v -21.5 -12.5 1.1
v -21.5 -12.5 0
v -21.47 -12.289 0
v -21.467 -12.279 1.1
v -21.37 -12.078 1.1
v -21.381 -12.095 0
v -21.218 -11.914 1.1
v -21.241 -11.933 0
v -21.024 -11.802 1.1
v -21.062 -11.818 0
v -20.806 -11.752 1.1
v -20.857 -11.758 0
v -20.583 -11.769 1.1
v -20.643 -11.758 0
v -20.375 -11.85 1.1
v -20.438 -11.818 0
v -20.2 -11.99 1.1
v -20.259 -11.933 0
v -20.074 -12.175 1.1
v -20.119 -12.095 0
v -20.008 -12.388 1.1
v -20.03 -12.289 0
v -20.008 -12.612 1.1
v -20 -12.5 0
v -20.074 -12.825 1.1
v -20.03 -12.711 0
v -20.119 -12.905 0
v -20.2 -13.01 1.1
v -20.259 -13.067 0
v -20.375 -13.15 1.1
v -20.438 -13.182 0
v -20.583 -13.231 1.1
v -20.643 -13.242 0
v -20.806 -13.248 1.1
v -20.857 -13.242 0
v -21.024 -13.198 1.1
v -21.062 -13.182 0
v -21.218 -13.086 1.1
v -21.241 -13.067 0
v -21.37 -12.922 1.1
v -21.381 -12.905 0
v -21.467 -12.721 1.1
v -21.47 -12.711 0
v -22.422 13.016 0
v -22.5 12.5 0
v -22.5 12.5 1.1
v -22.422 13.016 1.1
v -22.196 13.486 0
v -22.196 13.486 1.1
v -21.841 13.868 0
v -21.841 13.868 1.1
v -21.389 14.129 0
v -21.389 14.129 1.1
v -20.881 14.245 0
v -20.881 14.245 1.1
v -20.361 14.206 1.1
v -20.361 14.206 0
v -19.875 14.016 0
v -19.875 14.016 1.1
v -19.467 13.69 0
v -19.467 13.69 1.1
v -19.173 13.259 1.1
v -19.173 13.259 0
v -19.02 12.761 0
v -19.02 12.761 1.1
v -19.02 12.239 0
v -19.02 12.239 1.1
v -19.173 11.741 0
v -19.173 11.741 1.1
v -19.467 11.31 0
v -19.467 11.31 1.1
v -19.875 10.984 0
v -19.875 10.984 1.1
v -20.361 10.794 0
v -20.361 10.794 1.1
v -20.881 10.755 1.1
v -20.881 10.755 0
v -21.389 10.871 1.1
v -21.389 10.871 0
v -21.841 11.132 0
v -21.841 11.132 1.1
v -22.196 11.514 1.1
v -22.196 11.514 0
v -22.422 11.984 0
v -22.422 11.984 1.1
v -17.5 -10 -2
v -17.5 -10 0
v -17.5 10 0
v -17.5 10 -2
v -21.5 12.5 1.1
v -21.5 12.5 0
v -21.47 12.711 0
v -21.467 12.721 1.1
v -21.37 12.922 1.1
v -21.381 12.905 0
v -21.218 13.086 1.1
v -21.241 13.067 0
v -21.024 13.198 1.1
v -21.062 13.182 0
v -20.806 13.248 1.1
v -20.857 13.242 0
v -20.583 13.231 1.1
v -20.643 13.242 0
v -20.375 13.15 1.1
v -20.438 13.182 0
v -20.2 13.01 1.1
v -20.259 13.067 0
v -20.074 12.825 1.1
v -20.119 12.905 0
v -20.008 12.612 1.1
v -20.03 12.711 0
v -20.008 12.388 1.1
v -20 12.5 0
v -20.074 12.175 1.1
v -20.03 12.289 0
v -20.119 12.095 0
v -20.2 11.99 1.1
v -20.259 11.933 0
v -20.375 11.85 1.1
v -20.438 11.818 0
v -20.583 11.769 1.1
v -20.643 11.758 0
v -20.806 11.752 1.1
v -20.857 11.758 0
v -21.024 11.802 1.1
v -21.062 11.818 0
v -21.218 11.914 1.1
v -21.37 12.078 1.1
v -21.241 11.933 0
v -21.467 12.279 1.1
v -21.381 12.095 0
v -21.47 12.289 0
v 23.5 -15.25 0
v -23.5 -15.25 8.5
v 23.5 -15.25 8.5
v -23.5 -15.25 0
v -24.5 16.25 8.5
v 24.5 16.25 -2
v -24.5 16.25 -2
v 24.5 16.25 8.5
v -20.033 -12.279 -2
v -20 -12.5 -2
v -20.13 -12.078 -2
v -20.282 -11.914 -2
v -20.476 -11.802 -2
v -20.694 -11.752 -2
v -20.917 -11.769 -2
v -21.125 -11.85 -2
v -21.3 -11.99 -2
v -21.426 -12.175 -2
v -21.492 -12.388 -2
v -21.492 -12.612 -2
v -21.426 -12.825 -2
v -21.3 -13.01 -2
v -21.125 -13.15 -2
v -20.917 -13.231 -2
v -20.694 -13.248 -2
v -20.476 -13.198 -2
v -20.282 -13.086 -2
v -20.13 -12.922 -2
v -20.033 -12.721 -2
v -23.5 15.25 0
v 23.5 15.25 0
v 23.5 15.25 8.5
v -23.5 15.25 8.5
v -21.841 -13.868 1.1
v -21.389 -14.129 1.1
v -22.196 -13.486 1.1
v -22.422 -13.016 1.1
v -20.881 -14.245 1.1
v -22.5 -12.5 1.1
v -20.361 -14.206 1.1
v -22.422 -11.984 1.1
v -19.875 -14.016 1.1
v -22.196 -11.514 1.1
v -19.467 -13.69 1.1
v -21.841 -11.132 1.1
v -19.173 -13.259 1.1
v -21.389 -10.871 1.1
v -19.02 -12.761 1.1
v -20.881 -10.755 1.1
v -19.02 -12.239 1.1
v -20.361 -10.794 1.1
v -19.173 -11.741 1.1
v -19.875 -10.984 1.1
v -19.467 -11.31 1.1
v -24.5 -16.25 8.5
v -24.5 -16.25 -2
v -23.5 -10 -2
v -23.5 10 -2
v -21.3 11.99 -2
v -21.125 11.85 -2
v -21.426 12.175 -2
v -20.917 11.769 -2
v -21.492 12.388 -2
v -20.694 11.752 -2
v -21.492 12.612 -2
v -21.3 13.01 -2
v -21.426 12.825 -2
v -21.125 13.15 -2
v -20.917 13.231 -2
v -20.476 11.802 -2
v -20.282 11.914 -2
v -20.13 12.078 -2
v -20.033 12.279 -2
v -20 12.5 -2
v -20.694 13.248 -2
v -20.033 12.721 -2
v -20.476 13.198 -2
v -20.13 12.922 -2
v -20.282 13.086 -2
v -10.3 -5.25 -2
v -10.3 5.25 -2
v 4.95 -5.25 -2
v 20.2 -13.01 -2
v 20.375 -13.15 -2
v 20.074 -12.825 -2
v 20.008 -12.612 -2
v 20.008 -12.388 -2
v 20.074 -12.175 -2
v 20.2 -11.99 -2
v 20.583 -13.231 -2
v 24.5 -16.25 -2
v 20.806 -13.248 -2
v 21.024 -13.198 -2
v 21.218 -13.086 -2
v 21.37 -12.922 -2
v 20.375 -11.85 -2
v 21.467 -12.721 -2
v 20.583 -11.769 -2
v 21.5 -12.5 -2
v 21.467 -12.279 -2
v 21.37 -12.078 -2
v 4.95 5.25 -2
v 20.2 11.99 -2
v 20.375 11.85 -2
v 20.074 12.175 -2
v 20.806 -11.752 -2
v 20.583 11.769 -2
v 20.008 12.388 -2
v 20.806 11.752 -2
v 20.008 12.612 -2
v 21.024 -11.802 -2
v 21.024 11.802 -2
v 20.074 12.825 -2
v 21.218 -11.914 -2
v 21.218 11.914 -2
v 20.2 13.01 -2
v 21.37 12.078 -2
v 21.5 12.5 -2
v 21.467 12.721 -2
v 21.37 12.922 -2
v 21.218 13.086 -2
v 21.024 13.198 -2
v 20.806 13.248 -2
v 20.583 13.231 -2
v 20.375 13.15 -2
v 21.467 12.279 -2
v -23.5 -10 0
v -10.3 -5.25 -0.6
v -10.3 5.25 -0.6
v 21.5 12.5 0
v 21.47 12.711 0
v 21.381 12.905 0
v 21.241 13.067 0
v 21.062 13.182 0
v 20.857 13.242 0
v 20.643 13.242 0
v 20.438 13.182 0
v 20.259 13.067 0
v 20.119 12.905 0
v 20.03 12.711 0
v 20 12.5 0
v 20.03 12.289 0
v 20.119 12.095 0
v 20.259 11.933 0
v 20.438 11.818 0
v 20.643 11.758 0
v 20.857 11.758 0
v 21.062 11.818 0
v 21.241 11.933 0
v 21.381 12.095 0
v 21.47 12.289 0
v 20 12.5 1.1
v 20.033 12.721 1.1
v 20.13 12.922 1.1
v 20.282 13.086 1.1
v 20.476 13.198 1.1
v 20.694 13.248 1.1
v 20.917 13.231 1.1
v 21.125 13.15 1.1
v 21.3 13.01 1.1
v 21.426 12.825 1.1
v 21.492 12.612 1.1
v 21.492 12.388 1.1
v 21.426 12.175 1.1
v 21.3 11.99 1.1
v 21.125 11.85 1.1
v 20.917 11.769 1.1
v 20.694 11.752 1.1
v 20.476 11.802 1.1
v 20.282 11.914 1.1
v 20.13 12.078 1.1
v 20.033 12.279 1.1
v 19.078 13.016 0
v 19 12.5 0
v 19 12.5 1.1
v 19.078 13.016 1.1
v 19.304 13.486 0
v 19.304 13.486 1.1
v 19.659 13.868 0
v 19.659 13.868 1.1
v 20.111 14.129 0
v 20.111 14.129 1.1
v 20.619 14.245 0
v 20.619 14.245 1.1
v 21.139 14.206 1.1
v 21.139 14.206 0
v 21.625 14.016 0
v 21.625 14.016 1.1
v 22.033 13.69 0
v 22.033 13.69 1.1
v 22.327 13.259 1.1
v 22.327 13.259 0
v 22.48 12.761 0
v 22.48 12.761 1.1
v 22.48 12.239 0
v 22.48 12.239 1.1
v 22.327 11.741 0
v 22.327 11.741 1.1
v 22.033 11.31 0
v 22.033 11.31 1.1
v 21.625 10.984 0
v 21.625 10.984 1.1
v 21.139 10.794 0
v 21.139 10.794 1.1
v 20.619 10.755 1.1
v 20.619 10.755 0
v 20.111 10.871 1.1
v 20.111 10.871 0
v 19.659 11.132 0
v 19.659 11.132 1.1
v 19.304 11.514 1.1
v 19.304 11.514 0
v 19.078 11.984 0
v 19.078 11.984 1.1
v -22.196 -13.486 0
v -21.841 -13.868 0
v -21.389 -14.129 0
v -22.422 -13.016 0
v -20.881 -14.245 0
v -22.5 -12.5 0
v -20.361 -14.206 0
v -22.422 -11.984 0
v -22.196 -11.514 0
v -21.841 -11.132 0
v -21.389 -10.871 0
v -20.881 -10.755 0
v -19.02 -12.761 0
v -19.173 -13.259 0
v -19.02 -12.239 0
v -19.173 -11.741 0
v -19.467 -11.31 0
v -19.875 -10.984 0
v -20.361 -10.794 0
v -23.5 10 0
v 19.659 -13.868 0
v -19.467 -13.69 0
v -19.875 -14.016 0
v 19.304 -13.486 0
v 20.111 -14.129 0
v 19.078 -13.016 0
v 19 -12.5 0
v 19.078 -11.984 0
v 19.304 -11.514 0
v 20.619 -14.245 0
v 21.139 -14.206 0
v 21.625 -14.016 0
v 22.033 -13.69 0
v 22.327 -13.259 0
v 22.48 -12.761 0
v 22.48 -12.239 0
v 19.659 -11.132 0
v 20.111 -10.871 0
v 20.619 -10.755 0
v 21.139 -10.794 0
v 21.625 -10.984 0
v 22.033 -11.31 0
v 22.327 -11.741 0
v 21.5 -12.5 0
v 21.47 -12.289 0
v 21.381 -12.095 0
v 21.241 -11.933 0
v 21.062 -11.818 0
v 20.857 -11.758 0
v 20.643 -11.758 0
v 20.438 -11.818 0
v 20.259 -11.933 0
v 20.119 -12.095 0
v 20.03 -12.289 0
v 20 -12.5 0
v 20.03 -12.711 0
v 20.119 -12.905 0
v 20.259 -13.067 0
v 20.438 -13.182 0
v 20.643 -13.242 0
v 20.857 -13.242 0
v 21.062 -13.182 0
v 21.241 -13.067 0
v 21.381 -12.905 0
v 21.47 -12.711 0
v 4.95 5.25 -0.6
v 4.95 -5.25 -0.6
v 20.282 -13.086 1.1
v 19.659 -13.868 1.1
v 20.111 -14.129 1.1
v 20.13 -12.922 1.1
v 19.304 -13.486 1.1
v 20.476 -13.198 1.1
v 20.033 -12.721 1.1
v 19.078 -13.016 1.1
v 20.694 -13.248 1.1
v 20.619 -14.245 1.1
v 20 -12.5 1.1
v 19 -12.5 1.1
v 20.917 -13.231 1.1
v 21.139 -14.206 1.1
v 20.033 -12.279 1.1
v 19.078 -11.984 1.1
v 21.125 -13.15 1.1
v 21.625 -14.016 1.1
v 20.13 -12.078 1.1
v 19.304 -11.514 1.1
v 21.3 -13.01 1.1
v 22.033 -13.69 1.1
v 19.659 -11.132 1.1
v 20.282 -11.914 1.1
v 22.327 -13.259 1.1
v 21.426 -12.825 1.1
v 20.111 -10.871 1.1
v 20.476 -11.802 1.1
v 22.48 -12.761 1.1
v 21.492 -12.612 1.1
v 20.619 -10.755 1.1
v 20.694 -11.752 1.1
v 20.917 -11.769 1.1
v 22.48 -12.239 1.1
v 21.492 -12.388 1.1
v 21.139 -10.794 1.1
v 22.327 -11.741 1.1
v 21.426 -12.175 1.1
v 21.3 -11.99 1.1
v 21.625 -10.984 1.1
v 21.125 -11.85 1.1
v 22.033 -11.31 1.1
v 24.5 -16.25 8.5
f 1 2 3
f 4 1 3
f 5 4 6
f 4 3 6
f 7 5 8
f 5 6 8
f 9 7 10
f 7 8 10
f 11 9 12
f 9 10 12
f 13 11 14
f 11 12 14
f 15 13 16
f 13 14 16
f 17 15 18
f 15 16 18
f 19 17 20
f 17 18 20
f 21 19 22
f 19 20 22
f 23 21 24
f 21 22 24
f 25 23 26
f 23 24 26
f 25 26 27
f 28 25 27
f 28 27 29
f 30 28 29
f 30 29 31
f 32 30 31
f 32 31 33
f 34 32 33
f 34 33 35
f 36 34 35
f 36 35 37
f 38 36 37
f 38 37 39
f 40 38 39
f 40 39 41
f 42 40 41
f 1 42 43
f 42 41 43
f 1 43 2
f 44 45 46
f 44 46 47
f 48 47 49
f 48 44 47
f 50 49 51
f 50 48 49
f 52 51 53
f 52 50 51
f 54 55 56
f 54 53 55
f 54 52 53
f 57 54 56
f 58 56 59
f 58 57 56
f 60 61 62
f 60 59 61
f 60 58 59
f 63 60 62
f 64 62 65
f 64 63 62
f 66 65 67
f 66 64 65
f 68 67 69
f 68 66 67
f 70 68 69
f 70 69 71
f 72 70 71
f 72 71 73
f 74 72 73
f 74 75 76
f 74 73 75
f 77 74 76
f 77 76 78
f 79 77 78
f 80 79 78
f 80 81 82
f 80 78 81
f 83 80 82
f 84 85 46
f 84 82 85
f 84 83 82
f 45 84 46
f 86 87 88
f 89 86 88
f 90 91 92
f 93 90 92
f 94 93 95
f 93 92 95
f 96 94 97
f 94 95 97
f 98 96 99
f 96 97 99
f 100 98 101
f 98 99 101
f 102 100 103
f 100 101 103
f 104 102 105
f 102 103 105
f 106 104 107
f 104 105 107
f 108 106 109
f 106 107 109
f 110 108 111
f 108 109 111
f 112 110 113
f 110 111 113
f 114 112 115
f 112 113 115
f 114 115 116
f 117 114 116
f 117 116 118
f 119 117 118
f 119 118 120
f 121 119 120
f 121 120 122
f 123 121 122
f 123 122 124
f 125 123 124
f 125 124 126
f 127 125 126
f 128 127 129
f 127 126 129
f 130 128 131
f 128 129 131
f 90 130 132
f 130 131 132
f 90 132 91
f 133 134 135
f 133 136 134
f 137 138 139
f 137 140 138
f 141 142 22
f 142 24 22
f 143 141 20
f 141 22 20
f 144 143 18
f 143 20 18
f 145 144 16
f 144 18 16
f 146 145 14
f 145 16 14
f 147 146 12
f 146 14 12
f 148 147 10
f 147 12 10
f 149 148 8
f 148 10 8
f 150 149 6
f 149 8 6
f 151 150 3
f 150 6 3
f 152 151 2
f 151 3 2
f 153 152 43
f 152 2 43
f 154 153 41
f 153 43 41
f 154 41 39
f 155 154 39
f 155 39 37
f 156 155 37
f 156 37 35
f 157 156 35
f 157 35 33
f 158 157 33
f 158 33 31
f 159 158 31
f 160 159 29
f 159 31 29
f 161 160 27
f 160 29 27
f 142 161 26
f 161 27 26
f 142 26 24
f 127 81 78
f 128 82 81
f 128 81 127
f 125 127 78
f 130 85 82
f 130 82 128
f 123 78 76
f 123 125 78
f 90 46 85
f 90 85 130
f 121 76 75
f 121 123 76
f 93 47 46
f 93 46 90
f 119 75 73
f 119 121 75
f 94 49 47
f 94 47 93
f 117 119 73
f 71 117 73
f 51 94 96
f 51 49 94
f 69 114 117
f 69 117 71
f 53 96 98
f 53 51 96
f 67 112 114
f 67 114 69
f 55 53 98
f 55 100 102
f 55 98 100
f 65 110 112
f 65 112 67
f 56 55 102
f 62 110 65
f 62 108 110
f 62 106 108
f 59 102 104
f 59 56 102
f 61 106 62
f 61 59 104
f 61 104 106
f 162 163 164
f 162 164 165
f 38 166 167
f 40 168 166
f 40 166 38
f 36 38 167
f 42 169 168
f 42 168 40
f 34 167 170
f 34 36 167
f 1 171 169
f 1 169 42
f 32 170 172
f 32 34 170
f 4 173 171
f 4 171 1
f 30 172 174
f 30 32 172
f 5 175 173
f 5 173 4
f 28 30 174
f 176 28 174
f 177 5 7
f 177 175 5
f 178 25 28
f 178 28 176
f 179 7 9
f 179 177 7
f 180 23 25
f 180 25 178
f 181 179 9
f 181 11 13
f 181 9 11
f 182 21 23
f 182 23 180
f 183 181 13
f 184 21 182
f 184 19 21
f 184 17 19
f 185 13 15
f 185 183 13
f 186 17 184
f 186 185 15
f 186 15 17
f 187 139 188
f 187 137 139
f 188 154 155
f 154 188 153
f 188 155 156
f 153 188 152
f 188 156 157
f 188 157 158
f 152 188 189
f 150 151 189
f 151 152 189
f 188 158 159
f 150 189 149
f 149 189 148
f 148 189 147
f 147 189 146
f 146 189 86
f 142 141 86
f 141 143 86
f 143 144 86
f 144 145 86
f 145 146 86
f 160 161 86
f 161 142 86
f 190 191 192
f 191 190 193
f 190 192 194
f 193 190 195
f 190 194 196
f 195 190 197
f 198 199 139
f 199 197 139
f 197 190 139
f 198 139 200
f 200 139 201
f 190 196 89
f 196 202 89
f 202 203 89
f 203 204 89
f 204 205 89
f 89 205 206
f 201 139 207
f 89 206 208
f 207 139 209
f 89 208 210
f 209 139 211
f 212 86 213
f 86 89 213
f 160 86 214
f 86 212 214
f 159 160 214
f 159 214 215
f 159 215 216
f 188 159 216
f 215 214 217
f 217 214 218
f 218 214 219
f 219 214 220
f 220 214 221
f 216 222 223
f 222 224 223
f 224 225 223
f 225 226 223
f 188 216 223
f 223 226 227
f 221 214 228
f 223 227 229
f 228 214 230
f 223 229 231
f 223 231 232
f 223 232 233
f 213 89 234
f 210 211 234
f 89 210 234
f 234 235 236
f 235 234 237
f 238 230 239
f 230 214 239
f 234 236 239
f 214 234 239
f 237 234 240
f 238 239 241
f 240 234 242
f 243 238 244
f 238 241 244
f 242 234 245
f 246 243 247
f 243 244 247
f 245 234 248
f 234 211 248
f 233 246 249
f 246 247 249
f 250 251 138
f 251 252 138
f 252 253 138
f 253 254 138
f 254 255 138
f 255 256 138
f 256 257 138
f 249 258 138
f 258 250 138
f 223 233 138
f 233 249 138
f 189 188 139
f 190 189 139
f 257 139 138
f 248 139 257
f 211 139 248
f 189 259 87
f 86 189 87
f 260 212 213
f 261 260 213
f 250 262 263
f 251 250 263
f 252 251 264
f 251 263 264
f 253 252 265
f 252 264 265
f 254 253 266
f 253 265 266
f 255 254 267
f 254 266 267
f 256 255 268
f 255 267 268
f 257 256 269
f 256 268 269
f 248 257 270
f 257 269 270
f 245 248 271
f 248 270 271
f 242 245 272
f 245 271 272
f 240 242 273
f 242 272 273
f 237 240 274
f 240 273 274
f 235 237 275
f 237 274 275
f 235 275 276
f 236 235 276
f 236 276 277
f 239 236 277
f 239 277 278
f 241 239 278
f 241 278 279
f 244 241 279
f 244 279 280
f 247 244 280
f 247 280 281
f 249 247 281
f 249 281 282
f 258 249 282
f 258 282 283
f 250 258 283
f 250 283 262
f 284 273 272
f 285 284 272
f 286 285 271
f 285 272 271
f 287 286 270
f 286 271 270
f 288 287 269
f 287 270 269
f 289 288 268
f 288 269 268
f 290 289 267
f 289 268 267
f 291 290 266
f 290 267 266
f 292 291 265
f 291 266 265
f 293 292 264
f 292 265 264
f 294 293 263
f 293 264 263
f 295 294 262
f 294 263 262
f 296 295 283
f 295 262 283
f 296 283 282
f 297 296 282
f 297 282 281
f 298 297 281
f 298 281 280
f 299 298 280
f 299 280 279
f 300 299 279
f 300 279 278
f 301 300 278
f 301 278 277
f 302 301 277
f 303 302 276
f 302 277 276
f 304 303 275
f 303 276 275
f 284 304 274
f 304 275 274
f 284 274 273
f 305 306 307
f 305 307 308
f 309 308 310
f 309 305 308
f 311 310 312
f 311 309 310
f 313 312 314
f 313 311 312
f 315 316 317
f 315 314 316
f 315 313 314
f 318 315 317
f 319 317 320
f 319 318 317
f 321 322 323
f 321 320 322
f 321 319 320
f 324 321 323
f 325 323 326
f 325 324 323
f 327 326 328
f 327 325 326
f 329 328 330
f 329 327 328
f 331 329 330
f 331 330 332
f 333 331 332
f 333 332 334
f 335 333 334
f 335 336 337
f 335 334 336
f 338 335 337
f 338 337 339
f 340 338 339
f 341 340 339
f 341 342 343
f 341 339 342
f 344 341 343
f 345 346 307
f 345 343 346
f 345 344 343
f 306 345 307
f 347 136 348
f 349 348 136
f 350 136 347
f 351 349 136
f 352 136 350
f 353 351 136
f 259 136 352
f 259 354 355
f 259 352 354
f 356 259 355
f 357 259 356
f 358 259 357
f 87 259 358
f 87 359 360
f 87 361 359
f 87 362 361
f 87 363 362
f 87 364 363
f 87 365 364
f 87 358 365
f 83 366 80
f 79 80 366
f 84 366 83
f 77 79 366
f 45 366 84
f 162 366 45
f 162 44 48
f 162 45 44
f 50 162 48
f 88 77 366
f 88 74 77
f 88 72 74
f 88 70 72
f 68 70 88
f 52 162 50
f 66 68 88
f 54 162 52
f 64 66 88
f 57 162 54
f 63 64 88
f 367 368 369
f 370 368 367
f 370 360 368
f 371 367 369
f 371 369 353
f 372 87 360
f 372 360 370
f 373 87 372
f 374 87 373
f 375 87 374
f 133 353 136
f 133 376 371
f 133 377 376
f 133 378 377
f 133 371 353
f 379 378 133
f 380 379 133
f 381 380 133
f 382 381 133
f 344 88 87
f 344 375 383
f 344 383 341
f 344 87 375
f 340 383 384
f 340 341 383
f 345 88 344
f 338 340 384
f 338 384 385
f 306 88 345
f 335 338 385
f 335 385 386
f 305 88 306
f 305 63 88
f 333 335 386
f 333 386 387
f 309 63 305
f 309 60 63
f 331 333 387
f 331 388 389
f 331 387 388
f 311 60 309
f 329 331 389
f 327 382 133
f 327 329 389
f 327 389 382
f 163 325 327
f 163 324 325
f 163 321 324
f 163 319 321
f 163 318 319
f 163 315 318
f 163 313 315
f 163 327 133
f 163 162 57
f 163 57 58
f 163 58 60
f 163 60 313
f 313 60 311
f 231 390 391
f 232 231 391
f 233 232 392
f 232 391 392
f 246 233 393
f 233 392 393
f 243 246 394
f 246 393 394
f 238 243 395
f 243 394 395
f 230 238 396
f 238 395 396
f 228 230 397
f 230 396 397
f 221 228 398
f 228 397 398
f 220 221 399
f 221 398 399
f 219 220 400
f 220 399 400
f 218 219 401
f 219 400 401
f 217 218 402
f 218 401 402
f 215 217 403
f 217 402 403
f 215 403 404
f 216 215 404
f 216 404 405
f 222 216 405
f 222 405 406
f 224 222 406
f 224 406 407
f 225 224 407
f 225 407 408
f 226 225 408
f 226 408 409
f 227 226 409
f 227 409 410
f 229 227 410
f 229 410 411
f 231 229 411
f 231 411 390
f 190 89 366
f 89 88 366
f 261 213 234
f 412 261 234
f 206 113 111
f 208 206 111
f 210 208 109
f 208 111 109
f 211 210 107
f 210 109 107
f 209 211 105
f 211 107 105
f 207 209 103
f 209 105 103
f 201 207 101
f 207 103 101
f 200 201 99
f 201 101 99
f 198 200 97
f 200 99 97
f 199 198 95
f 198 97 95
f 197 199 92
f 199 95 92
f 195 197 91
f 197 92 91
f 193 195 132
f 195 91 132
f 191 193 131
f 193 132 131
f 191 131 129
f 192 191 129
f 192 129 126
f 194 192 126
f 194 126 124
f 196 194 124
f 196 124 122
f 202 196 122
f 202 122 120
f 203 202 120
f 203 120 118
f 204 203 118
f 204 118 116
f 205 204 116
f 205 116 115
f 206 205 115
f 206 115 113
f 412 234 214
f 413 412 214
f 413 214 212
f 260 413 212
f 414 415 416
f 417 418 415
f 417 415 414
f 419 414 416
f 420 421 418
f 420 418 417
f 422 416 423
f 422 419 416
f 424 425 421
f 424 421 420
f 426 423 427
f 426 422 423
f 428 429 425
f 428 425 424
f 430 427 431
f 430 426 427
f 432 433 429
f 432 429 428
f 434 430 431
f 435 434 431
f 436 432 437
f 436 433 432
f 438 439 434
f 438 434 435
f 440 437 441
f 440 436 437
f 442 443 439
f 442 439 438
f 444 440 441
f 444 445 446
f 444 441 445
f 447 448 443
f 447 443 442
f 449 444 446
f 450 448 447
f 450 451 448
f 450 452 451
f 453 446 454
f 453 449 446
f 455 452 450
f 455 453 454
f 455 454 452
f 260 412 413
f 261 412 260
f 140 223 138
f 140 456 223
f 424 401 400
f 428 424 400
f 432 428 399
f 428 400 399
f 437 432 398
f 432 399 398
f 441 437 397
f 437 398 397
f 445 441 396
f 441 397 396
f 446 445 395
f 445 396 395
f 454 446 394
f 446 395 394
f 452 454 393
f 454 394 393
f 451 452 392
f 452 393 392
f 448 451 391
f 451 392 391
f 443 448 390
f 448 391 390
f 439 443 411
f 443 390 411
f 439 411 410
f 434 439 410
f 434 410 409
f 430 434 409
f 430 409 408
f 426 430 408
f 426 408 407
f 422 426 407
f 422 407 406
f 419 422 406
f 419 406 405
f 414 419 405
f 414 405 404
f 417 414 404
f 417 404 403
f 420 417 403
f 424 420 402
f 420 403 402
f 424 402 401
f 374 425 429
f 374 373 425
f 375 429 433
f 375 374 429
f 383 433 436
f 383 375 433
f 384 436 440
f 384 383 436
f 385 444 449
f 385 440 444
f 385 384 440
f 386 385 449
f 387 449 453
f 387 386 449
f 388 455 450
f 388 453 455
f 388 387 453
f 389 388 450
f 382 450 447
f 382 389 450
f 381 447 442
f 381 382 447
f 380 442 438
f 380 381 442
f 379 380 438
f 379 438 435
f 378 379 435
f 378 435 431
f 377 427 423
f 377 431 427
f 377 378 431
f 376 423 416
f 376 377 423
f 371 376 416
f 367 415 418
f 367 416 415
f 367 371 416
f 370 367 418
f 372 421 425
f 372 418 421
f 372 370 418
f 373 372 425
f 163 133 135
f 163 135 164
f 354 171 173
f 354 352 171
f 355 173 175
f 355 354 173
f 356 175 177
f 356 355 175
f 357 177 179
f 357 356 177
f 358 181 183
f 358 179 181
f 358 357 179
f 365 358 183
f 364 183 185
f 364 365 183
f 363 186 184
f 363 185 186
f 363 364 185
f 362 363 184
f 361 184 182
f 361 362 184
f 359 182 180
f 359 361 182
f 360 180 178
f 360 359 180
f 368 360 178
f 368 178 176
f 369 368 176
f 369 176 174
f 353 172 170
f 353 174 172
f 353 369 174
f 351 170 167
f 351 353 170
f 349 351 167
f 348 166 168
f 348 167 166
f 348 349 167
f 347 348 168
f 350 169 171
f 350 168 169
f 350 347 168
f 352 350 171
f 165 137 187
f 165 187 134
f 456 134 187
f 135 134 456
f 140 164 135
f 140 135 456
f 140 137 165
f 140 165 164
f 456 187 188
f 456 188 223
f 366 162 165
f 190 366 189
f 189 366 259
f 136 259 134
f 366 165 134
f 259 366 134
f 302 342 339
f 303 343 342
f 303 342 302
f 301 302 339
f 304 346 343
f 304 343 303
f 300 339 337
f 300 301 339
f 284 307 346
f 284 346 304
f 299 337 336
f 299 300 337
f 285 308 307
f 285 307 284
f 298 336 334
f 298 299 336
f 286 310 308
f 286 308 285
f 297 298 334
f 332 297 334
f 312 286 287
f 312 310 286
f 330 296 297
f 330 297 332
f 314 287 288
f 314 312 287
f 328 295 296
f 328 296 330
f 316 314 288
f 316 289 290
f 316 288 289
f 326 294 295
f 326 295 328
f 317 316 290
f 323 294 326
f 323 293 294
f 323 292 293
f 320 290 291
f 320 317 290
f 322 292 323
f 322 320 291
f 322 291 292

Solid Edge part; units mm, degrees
sketch "Sketch1" plane through (0, 0, 0) normal (0, 0, 1) x (1, 0, 0)
  line L0 (-24.5, 16.25) -> (-24.5, -16.25)
  line L1 (-24.5, -16.25) -> (24.5, -16.25)
  line L2 (24.5, -16.25) -> (24.5, 16.25)
  line L3 (24.5, 16.25) -> (-24.5, 16.25)
extrude "Protrusion1" add sketch "Sketch1" against normal blind 2
sketch "Sketch2" plane through (0, 0, 0) normal (0, 0, 1) x (1, 0, 0)
  line L0 (-23.5, 15.25) -> (-23.5, -15.25)
  line L1 (-23.5, -15.25) -> (23.5, -15.25)
  line L2 (23.5, -15.25) -> (23.5, 15.25)
  line L3 (23.5, 15.25) -> (-23.5, 15.25)
  line L4 (-24.5, 16.25) -> (-24.5, -16.25)
  line L5 (-24.5, -16.25) -> (24.5, -16.25)
  line L6 (24.5, -16.25) -> (24.5, 16.25)
  line L7 (24.5, 16.25) -> (-24.5, 16.25)
  dimension "D1" = 30.5
  dimension "D2" = 47
  dimension "D3" = 1
  dimension "D4" = 1.5
  dimension "D5" = 25
  dimension "D6" = 41.5
  dimension "D7" = 1
  dimension "D8" = 1
  dimension "D9" = 1
  dimension "D10" = 1
  dimension "D11" = 20
  dimension "D12" = 6
extrude "ExtrudedProtrusion_2" add sketch "Sketch2" along normal blind 8.5
sketch "Sketch3" plane through (0, 0, 0) normal (0, 0, 1) x (1, 0, 0)
  line L0 (-17.5, -10) -> (-17.5, 10)
  line L1 (-17.5, 10) -> (-23.5, 10)
  line L2 (-23.5, 10) -> (-23.5, -10)
  line L3 (-23.5, -10) -> (-17.5, -10)
extrude "Cutout1" cut sketch "Sketch3" against normal up to vertex (2 mm away)
sketch "Sketch4" plane through (0, 0, 0) normal (0, 0, 1) x (1, 0, 0)
  circle A0 centre (-20.75, 12.5) radius 0.75
  circle A1 centre (-20.75, -12.5) radius 0.75
  circle A2 centre (20.75, -12.5) radius 0.75
  circle A3 centre (20.75, 12.5) radius 0.75
  dimension "D1" = 3.5
extrude "Cutout2" cut sketch "Sketch4" against normal up to vertex (2 mm away)
sketch "Sketch5" plane through (0, 0, -2) normal (0, 0, -1) x (1, 0, 0)
  line L0 (-10.05, 5.5) -> (-10.05, -4.5)
  line L1 (-10.05, -4.5) -> (4.7, -4.5)
  line L2 (4.7, -4.5) -> (4.7, 5.5)
  line L3 (4.7, 5.5) -> (-10.05, 5.5)
extrude "ExtrudedCutout_4" cut sketch "Sketch5" against normal blind 1
sketch "Sketch6" plane through (0, 0, -2) normal (0, 0, -1) x (1, 0, 0)
  line L0 (4.7, 5.5) -> (-10.05, 5.5)
  line L1 (-10.05, 5.5) -> (-10.05, -4.5)
  line L2 (-10.05, -4.5) -> (4.7, -4.5)
  line L3 (4.7, -4.5) -> (4.7, 5.5)
extrude "Protrusion2" add sketch "Sketch6" against normal up to vertex (1 mm away)
sketch "Sketch7" plane through (0, 0, -2) normal (0, 0, -1) x (1, 0, 0)
  line L0 (-10.05, -5) -> (4.7, -5)
  line L1 (4.7, -5) -> (4.7, 5)
  line L2 (4.7, 5) -> (-10.05, 5)
  line L3 (-10.05, 5) -> (-10.05, -5)
extrude "ExtrudedCutout_5" cut sketch "Sketch7" against normal blind 1
sketch "Sketch8" plane through (0, 0, -2) normal (0, 0, -1) x (1, 0, 0)
  line L0 (4.95, 5.25) -> (-10.3, 5.25)
  line L1 (-10.3, 5.25) -> (-10.3, -5.25)
  line L2 (-10.3, -5.25) -> (4.95, -5.25)
  line L3 (4.95, -5.25) -> (4.95, 5.25)
extrude "ExtrudedCutout_6" cut sketch "Sketch8" against normal blind 1.4
sketch "Sketch9" plane through (0, 0, 0) normal (0, 0, 1) x (-1, 0, 0)
  circle A0 centre (20.75, 12.5) radius 1.75
  circle A1 centre (20.75, 12.5) radius 0.75
  circle A2 centre (20.75, -12.5) radius 1.75
  circle A3 centre (20.75, -12.5) radius 0.75
  circle A4 centre (-20.75, -12.5) radius 1.75
  circle A5 centre (-20.75, -12.5) radius 0.75
  circle A6 centre (-20.75, 12.5) radius 1.75
  circle A7 centre (-20.75, 12.5) radius 0.75
  dimension "D1" = 3.5
extrude "ExtrudedProtrusion_6" add sketch "Sketch9" along normal blind 1.1
properties material "Graphite"
